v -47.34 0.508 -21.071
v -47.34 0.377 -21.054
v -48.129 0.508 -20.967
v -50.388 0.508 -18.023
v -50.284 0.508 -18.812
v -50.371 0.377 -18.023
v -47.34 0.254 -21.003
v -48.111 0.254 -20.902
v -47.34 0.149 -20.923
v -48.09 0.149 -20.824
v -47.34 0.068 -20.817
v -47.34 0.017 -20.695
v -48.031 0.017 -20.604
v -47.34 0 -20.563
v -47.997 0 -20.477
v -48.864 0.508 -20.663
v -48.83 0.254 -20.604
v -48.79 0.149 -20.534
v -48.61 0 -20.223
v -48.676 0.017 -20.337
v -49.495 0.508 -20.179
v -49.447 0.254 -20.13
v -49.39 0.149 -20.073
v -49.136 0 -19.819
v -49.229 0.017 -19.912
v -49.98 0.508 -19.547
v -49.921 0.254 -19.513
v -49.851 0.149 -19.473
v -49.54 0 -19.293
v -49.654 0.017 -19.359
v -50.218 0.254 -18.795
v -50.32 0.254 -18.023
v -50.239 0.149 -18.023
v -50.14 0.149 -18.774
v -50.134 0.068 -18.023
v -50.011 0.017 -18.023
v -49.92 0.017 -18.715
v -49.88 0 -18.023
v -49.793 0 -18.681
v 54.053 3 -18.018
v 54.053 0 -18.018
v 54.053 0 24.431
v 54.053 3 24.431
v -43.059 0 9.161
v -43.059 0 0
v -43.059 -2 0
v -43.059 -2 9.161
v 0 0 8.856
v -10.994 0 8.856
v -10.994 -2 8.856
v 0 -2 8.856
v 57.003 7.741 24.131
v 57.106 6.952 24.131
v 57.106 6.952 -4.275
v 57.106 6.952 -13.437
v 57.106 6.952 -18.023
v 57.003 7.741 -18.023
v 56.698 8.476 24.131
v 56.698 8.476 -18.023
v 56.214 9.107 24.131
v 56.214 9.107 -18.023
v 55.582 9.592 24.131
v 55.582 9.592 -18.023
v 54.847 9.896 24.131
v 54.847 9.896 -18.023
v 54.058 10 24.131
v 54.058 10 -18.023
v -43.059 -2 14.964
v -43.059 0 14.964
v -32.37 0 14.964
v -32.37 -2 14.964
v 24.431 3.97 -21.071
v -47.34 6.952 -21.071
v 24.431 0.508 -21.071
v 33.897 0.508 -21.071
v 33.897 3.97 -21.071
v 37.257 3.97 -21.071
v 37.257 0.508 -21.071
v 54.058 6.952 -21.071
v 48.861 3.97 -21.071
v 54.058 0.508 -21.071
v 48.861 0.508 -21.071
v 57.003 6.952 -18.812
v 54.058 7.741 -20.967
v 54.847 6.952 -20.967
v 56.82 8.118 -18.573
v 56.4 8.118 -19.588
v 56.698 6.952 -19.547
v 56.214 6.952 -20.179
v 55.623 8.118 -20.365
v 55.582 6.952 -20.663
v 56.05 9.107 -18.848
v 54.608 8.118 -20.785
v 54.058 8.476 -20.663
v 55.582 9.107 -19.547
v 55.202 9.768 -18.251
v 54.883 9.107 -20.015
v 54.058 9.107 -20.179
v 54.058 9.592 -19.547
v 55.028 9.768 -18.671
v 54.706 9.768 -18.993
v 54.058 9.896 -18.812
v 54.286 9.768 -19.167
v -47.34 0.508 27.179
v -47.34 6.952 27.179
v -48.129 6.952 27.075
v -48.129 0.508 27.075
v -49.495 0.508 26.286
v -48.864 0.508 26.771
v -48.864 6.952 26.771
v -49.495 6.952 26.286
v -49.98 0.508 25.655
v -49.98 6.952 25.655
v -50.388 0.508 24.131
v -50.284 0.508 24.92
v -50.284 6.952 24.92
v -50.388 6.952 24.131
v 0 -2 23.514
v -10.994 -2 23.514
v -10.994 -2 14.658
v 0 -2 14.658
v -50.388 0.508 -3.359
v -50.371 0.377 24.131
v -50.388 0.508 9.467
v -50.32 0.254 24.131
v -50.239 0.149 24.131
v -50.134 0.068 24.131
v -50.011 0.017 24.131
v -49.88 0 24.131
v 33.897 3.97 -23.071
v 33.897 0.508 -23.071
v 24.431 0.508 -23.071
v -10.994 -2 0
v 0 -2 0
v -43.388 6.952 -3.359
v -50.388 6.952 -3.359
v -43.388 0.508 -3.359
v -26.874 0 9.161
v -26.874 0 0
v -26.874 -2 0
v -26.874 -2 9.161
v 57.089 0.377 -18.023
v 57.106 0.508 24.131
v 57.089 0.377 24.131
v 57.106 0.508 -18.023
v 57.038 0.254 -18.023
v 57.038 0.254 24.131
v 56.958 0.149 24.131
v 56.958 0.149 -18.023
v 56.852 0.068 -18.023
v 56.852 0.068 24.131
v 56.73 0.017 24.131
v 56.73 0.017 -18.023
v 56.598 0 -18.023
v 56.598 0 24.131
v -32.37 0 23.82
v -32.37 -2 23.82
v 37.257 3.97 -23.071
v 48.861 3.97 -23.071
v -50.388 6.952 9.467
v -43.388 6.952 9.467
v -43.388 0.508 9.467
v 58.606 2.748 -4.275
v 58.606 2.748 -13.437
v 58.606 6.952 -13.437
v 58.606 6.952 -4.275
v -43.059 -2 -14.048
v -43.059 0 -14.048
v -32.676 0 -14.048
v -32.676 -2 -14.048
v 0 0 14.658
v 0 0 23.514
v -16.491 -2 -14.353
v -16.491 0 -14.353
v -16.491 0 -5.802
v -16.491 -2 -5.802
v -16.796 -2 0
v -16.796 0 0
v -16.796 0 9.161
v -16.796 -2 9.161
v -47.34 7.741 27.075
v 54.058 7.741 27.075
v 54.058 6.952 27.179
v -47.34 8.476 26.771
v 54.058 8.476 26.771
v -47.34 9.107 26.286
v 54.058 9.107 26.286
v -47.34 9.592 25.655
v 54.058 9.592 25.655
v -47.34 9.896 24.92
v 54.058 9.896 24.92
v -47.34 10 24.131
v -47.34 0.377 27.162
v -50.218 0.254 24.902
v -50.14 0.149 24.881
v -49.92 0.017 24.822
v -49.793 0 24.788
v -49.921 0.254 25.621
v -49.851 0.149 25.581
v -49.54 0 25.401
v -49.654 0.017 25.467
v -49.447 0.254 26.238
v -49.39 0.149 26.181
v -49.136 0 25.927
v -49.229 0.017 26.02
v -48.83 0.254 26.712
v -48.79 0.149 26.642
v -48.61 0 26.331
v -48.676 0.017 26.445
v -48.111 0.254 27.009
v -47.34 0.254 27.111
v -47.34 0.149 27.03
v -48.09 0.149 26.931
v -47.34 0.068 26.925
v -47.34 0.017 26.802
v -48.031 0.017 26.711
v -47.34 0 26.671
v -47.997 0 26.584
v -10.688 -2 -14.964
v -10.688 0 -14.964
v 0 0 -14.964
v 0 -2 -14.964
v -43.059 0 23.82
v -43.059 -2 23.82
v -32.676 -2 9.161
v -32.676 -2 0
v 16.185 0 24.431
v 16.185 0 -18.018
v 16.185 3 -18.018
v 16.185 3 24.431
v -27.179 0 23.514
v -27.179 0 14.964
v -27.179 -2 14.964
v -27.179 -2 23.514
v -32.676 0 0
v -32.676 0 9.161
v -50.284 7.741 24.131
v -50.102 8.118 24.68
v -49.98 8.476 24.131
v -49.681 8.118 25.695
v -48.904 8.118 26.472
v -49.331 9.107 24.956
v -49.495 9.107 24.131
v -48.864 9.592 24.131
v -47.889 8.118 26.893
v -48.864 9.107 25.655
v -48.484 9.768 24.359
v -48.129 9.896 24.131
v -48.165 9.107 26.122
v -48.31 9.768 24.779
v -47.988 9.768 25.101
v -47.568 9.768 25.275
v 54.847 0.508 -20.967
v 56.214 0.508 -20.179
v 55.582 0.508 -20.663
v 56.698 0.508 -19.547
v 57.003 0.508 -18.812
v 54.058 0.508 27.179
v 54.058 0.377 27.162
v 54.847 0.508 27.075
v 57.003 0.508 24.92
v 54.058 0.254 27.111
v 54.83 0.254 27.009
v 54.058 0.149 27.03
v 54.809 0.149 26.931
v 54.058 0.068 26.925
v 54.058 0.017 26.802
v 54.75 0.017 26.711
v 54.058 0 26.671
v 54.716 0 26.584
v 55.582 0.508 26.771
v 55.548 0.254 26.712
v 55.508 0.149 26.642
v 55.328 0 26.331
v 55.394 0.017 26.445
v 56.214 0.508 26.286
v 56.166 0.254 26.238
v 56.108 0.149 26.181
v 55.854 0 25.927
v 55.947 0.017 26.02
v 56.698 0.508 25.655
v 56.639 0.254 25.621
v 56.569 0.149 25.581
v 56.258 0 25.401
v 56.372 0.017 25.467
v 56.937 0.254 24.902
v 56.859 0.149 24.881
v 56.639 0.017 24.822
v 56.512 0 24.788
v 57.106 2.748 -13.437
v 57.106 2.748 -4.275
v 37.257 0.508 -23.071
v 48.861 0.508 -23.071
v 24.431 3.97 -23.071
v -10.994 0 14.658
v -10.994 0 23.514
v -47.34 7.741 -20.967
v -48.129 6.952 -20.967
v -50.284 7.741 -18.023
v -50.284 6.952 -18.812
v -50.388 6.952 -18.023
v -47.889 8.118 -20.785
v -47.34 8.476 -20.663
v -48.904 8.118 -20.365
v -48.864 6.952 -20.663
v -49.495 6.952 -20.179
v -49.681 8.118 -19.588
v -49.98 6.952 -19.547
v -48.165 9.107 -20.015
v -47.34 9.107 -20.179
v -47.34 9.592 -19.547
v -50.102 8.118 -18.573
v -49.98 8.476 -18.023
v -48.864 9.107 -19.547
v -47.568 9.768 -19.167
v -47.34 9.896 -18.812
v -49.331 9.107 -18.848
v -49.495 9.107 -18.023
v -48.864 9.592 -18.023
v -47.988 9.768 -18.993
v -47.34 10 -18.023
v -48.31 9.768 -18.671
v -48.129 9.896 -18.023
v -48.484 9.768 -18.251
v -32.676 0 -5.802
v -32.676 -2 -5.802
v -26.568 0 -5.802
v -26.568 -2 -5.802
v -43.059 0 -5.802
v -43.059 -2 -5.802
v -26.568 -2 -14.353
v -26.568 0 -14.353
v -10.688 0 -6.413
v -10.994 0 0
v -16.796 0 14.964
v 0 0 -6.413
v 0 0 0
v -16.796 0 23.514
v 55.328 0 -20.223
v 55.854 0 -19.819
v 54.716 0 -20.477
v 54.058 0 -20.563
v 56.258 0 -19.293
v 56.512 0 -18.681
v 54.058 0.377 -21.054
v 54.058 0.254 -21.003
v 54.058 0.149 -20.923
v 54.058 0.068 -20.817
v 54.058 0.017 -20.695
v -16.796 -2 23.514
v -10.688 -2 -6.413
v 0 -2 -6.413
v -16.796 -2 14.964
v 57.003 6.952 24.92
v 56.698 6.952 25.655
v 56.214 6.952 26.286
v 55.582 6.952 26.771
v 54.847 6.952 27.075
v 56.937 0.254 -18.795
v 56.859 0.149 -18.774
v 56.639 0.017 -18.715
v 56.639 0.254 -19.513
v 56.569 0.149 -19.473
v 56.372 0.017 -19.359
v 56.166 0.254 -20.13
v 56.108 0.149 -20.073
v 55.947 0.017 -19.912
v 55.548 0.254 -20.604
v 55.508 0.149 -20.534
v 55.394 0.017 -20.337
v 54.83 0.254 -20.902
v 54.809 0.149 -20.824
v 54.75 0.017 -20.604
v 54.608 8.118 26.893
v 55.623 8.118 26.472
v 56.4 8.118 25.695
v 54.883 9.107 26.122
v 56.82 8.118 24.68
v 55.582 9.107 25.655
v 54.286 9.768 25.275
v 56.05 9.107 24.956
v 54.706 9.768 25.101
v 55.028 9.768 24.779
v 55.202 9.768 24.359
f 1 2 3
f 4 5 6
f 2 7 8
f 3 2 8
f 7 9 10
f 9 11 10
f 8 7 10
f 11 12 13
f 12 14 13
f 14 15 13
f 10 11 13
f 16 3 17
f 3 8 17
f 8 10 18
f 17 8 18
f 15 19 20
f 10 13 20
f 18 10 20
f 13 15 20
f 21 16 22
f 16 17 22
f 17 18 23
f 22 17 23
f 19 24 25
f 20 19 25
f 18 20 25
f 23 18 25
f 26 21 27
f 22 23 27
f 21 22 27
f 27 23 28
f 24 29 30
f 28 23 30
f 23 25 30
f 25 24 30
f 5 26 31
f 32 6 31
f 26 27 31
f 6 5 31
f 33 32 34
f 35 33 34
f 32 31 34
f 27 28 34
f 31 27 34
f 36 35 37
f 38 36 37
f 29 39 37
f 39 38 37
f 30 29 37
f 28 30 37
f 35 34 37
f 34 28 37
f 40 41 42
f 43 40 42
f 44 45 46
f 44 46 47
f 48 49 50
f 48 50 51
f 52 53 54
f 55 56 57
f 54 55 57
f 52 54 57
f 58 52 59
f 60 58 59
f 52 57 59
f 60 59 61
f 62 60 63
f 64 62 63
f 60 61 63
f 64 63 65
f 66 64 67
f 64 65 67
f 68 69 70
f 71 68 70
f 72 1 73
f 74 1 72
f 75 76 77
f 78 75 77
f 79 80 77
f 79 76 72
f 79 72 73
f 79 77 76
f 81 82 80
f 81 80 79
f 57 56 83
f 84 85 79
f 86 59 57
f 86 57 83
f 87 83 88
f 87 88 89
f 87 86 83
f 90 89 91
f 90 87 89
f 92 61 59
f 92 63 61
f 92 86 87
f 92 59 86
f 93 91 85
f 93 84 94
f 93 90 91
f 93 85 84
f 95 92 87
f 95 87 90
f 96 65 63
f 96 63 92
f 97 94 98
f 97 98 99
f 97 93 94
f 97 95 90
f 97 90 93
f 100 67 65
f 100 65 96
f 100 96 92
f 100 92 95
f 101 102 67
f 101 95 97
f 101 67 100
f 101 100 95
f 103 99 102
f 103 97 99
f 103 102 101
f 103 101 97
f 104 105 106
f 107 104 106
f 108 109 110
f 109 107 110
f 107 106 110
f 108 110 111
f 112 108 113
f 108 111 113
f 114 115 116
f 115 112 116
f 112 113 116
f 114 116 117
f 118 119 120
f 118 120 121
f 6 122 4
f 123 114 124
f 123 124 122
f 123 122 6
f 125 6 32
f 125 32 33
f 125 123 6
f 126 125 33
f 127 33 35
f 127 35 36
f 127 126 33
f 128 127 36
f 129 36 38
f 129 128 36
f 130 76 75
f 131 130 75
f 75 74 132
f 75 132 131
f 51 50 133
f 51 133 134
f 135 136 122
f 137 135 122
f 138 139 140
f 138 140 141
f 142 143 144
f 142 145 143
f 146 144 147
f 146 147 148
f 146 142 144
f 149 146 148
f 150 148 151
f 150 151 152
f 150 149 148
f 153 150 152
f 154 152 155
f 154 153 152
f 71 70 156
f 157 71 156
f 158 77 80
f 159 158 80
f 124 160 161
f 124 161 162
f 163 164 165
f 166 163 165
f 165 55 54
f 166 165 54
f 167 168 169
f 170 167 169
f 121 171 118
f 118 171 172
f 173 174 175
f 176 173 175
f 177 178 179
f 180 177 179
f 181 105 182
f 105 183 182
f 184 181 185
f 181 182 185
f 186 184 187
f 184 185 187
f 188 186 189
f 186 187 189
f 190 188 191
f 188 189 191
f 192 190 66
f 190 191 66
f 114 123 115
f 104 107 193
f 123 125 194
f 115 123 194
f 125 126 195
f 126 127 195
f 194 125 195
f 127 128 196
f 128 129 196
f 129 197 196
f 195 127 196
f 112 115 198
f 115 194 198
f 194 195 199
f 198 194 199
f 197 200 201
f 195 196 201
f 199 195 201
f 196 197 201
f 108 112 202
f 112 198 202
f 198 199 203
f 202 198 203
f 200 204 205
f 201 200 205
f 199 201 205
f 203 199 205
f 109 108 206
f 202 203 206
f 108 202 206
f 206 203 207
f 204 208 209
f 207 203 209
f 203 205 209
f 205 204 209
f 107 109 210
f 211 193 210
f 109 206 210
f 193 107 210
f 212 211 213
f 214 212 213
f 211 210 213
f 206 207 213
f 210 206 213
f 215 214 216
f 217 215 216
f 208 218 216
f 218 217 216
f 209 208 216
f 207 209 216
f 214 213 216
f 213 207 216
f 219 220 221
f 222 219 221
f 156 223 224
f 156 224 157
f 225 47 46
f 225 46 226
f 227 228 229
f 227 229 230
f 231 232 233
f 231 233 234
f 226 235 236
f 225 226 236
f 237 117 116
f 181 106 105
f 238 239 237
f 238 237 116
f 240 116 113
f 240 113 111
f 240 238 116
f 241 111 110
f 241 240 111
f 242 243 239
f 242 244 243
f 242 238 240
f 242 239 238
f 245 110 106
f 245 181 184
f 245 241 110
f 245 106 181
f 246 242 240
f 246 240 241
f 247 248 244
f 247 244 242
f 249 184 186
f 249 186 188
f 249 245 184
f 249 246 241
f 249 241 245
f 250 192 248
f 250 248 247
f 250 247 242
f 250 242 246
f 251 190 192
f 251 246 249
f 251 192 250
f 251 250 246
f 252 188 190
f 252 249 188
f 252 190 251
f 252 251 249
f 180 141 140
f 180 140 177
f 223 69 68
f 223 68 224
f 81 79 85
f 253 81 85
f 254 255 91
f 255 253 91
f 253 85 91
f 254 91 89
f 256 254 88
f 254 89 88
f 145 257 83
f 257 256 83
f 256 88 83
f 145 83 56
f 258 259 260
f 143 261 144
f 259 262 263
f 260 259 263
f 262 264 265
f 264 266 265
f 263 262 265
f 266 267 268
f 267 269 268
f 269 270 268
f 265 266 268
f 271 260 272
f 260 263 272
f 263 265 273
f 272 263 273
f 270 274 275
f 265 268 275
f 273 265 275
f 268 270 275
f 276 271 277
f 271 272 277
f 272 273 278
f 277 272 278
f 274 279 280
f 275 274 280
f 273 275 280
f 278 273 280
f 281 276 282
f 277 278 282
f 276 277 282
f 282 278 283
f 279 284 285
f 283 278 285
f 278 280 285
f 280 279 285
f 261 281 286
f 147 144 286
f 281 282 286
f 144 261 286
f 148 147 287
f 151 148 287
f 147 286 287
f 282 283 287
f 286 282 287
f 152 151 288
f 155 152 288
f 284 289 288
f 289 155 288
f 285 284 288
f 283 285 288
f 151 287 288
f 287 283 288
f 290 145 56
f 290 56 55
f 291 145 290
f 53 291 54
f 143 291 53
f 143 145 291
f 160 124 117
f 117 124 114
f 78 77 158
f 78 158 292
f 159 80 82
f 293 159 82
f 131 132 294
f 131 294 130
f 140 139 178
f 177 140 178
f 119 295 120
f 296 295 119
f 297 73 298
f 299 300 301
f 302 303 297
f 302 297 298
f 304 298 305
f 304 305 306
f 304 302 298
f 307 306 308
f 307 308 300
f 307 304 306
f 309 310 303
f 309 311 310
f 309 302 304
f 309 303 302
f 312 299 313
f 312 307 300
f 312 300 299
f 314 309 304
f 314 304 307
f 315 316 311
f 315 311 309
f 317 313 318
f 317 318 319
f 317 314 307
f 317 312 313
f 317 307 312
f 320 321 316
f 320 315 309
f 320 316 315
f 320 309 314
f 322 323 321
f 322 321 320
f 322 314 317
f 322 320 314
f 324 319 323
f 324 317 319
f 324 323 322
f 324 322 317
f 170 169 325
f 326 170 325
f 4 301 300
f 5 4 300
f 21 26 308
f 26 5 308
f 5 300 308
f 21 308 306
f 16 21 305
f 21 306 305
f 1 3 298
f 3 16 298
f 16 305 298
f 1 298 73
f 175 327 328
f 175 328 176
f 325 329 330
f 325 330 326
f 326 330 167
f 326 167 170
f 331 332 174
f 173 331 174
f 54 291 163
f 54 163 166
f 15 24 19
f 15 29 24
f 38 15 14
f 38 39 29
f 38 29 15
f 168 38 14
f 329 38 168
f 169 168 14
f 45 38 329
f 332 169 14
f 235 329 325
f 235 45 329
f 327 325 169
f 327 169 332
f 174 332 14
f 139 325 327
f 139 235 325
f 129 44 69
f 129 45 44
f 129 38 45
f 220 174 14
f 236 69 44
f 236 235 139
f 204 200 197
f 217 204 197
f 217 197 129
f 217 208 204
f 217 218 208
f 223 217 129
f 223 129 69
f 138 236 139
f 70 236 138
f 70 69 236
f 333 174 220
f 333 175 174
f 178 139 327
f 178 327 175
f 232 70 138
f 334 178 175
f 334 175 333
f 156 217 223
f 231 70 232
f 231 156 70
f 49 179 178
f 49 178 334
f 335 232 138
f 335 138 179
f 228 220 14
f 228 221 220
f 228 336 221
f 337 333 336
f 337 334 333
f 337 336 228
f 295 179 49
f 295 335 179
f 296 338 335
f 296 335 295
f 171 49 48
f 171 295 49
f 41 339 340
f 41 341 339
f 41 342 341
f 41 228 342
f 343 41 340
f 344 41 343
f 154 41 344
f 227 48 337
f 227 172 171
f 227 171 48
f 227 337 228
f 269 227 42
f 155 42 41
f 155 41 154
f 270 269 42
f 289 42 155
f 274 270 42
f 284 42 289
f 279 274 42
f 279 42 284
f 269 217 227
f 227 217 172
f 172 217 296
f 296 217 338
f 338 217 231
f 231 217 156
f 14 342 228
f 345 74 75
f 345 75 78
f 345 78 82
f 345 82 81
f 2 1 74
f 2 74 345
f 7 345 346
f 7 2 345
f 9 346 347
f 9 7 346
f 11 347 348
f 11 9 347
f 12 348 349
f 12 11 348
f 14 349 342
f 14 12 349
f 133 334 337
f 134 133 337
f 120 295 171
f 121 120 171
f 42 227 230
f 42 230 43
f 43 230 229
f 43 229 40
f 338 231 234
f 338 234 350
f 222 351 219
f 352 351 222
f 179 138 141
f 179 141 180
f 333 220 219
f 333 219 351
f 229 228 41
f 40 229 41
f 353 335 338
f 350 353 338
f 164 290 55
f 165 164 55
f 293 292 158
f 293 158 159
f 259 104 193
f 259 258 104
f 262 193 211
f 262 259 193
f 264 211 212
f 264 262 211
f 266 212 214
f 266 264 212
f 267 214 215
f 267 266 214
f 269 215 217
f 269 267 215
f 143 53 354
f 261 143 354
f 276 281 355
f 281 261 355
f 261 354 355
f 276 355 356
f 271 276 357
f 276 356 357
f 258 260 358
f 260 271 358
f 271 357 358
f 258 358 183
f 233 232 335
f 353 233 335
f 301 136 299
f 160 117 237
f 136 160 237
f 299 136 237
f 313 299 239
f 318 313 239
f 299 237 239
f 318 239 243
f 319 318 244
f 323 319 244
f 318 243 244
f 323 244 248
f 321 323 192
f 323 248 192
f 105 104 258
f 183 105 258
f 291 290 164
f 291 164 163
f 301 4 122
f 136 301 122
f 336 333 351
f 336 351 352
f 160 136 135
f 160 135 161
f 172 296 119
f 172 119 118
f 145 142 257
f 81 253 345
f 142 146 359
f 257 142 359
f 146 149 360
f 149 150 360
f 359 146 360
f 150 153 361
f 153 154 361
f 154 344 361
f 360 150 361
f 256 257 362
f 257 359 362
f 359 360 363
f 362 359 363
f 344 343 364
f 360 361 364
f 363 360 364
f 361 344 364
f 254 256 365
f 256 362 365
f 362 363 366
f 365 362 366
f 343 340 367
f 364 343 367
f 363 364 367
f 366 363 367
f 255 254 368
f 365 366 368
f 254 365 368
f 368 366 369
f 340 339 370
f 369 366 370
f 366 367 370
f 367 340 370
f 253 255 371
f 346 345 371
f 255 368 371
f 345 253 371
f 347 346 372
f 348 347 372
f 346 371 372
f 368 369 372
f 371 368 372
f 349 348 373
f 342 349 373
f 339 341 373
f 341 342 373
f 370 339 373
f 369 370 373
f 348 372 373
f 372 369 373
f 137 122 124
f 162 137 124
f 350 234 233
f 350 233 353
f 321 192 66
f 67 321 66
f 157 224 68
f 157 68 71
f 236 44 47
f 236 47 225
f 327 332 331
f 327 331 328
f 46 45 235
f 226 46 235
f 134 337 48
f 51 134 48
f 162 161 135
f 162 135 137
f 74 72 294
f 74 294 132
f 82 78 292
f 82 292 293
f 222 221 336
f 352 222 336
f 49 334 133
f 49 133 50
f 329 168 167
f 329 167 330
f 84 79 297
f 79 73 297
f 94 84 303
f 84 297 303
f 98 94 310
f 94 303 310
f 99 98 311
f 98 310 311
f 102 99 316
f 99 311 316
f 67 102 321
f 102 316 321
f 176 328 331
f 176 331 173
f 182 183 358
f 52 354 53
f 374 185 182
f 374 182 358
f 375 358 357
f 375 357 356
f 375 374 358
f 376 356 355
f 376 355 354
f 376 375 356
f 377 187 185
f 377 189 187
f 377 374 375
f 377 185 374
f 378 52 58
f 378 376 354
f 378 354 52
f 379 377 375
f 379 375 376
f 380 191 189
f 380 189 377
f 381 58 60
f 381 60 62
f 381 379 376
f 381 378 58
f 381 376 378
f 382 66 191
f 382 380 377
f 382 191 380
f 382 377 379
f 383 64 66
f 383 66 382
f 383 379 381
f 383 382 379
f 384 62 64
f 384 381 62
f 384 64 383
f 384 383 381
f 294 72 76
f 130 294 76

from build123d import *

# Parameters (mm, degrees)
F0_W      = 107.4943505228
F0_H      = 48.250304535
F1_DEPTH  = 10
F2_W      = 37.8673281521
F2_H      = 42.4480531365
F3_DEPTH  = 3
F4_W      = 10.9937405214
F4_H      = 8.8560692966
F5_DEPTH  = 2
F6_W      = 10.9937405214
F6_H      = 8.8560692966
F7_DEPTH  = 2
F8_W      = 10.6883589178
F8_H      = 8.5506872274
F9_DEPTH  = 2
F10_W     = 10.382976383
F10_H     = 8.5506876931
F11_DEPTH = 2
F12_W     = 10.0775957108
F12_H     = 9.1614499688
F13_DEPTH = 2
F14_W     = 10.0775957108
F14_H     = 8.5506867617
F15_DEPTH = 2
F16_W     = 10.6883570552
F16_H     = 8.8560683653
F17_DEPTH = 2
F18_W     = 10.382976383
F18_H     = 9.1614499688
F19_DEPTH = 2
F20_W     = 10.382976383
F20_H     = 8.2453051582
F21_DEPTH = 2
F22_R     = 3.048
F23_R     = 3.048
F24_R     = 3.048
F25_R     = 3.048
F26_R     = 3.048
F27_R     = 0.508
F28_W     = 6.444
F28_H     = 12.8260310739
F29_DEPTH = 7
F30_W     = 11.6044990718
F30_H     = 3.461962243
F31_DEPTH = 2
F32_W     = 9.4668287784
F32_H     = 3.461962243
F33_DEPTH = 2
F34_W     = 4.2035634727
F34_H     = 9.1614509001
F35_DEPTH = 1.5


with BuildPart() as f1:
    # F0 (on Front) → F1 (new body)
    with BuildSketch(Plane.XZ):
        with Locations((3.3591967076, 3.0538169667)):
            Rectangle(F0_W, F0_H)
    extrude(amount=-F1_DEPTH)

    # F2 (on face) → F3 (cut)
    with BuildSketch(Plane.XZ):
        with Locations((35.1188937202, 3.2065073028)):
            Rectangle(F2_W, F2_H)
    extrude(amount=-F3_DEPTH, mode=Mode.SUBTRACT)

    # F4 (on face) → F5 (join)
    with BuildSketch(Plane.XZ):
        with Locations((-5.4968702607, 19.0863553435)):
            Rectangle(F4_W, F4_H)
    extrude(amount=F5_DEPTH)

    # F6 (on face) → F7 (join)
    with BuildSketch(Plane.XZ):
        with Locations((-5.4968702607, 4.4280346483)):
            Rectangle(F6_W, F6_H)
    extrude(amount=F7_DEPTH)

    # F8 (on face) → F9 (join)
    with BuildSketch(Plane.XZ):
        with Locations((-5.3441794589, -10.688358685)):
            Rectangle(F8_W, F8_H)
    extrude(amount=F9_DEPTH)

    # F10 (on face) → F11 (join)
    with BuildSketch(Plane.XZ):
        with Locations((-21.9874810427, 19.2390461452)):
            Rectangle(F10_W, F10_H)
    extrude(amount=F11_DEPTH)

    # F12 (on face) → F13 (join)
    with BuildSketch(Plane.XZ):
        with Locations((-21.8347907066, 4.5807249844)):
            Rectangle(F12_W, F12_H)
    extrude(amount=F13_DEPTH)

    # F14 (on face) → F15 (join)
    with BuildSketch(Plane.XZ):
        with Locations((-21.5294081718, -10.0775957108)):
            Rectangle(F14_W, F14_H)
    extrude(amount=F15_DEPTH)

    # F16 (on face) → F17 (join)
    with BuildSketch(Plane.XZ):
        with Locations((-37.714637816, 19.3917364813)):
            Rectangle(F16_W, F16_H)
    extrude(amount=F17_DEPTH)

    # F18 (on face) → F19 (join)
    with BuildSketch(Plane.XZ):
        with Locations((-37.8673281521, 4.5807249844)):
            Rectangle(F18_W, F18_H)
    extrude(amount=F19_DEPTH)

    # F20 (on face) → F21 (join)
    with BuildSketch(Plane.XZ):
        with Locations((-37.8673281521, -9.924904909)):
            Rectangle(F20_W, F20_H)
    extrude(amount=F21_DEPTH)

    # F22
    f22_edges = [f1.edges().sort_by_distance(p)[0] for p in [
        (-50.387979, 5, -21.071335),
    ]]
    fillet(f22_edges, radius=F22_R)

    # F23
    f23_edges = [f1.edges().sort_by_distance(p)[0] for p in [
        (57.106372, 5, -21.071335),
    ]]
    fillet(f23_edges, radius=F23_R)

    # F24
    f24_edges = [f1.edges().sort_by_distance(p)[0] for p in [
        (57.106372, 5, 27.178969),
    ]]
    fillet(f24_edges, radius=F24_R)

    # F25
    f25_edges = [f1.edges().sort_by_distance(p)[0] for p in [
        (-50.387979, 5, 27.178969),
    ]]
    fillet(f25_edges, radius=F25_R)

    # F26
    f26_edges = [f1.edges().sort_by_distance(p)[0] for p in [
        (3.359197, 10, 27.178969),
    ]]
    fillet(f26_edges, radius=F26_R)

    # F27
    f27_edges = [f1.edges().sort_by_distance(p)[0] for p in [
        (3.359197, 0, 27.178969),
    ]]
    fillet(f27_edges, radius=F27_R)

    # F28 (on face) → F29 (cut)
    with BuildSketch(Plane(origin=(-50.3879785538, 0, 0), x_dir=(0, -1, 0), z_dir=(-1, 0, 0))):
        with Locations((-3.73, 3.0538169667)):
            Rectangle(F28_W, F28_H)
    extrude(amount=-F29_DEPTH, mode=Mode.SUBTRACT)

    # F30 (on face) → F31 (join)
    with BuildSketch(Plane(origin=(0, 0, -21.0713353008), x_dir=(1, 0, 0), z_dir=(0, 0, -1))):
        with Locations((43.0588182062, -2.2389811215)):
            Rectangle(F30_W, F30_H)
    extrude(amount=F31_DEPTH)

    # F32 (on face) → F33 (join)
    with BuildSketch(Plane(origin=(0, 0, -21.0713353008), x_dir=(1, 0, 0), z_dir=(0, 0, -1))):
        with Locations((29.1639482602, -2.2389811215)):
            Rectangle(F32_W, F32_H)
    extrude(amount=F33_DEPTH)

    # F34 (on face) → F35 (join)
    with BuildSketch(Plane.YZ.offset(57.106371969)):
        with Locations((4.8502182637, -8.8560688309)):
            Rectangle(F34_W, F34_H)
    extrude(amount=F35_DEPTH)


solid = f1.part
